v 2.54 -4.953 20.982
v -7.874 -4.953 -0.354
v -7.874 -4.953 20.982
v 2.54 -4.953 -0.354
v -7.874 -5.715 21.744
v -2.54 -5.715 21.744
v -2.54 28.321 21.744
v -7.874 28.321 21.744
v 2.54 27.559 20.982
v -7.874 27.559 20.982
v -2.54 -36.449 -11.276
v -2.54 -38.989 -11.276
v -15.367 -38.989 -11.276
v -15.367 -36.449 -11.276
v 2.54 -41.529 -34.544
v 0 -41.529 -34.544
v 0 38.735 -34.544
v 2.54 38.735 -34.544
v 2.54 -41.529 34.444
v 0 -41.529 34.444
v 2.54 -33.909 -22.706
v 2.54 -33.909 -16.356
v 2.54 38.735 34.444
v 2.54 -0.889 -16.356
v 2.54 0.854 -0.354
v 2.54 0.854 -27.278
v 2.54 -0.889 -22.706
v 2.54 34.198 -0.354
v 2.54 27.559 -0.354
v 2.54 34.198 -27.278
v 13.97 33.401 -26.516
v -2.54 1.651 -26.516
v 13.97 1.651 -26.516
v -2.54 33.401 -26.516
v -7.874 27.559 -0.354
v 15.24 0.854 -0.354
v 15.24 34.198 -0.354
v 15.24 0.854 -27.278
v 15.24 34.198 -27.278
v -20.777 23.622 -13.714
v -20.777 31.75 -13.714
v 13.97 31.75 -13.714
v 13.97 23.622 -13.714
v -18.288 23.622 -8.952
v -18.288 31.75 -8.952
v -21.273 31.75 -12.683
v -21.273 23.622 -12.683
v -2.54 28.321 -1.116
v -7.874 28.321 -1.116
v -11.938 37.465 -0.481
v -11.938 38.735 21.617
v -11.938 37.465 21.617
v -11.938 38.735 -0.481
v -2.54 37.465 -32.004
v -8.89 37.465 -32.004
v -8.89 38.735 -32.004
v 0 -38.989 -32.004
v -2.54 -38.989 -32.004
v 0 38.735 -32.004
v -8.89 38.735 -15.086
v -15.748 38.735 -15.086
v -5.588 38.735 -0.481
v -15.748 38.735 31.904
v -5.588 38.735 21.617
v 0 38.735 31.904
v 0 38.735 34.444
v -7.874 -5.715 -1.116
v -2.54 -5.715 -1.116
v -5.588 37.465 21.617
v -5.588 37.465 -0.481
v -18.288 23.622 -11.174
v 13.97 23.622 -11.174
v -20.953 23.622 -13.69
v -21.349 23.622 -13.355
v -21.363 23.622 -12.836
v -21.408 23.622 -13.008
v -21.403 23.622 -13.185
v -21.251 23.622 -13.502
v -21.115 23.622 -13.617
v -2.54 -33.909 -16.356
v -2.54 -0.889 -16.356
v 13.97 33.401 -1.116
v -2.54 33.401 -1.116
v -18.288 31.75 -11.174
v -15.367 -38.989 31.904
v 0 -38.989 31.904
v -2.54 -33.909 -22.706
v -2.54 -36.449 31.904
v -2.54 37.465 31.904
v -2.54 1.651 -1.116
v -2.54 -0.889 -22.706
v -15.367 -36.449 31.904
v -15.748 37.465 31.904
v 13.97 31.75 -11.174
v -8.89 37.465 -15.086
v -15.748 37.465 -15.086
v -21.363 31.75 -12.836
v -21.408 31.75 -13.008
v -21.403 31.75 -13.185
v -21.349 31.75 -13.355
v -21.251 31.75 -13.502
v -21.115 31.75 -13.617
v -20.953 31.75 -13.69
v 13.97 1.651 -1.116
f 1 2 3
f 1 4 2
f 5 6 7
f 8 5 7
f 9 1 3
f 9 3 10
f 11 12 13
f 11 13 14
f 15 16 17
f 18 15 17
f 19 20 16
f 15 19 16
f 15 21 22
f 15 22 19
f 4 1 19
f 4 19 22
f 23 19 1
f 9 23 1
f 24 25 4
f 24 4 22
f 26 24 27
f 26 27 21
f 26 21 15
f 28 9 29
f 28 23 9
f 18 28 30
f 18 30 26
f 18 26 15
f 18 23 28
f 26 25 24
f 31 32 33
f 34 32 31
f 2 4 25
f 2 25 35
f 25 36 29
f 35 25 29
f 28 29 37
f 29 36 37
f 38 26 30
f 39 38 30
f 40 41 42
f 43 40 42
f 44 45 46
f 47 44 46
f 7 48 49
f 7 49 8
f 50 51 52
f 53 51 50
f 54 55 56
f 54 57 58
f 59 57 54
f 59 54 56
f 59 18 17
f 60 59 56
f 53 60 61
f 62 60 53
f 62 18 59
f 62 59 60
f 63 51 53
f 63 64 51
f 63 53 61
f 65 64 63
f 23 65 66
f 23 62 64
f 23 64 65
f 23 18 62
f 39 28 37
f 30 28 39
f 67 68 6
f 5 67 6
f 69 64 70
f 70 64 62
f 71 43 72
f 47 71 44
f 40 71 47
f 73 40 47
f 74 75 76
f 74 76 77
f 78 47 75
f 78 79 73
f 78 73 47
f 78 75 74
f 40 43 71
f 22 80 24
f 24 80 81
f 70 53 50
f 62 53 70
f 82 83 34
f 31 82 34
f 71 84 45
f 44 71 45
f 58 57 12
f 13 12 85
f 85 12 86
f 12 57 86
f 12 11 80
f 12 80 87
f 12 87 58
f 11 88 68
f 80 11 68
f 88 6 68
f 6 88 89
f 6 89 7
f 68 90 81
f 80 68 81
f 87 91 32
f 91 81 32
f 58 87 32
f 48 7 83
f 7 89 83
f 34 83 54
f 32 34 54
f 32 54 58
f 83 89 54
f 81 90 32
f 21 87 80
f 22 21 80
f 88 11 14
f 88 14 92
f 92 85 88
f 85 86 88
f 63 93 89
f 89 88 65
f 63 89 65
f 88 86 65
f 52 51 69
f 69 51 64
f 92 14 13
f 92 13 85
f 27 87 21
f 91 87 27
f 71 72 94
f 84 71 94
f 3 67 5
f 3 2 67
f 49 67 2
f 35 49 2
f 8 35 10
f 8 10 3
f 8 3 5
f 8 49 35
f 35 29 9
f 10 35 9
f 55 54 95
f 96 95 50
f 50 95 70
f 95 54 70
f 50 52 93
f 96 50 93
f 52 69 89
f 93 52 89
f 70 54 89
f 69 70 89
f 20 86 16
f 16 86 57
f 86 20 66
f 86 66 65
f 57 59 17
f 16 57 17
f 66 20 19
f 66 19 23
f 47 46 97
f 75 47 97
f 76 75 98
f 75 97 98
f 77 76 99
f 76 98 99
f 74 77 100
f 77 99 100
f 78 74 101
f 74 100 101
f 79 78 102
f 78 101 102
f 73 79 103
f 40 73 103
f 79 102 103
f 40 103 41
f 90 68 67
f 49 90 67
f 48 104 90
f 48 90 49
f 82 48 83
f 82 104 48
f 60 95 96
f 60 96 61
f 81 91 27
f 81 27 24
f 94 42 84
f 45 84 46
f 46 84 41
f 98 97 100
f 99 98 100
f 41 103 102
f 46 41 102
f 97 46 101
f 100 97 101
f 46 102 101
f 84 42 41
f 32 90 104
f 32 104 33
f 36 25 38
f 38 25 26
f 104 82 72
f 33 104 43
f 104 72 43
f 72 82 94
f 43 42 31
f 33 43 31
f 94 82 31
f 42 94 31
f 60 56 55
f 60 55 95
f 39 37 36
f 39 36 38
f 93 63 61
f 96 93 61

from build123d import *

# Parameters (mm, degrees)
SKETCH1_W            = 68.987924
SKETCH1_H            = 80.264
BOSS_EXTRUDE3_DEPTH  = 2.54
SKETCH1_7_W          = 63.907924
SKETCH1_7_H          = 77.724
BOSS_EXTRUDE4_DEPTH  = 2.54
SKETCH1_9_W          = 46.99
SKETCH1_9_H          = 1.27
BOSS_EXTRUDE6_DEPTH  = 15.748
SKETCH2_W            = 6.35
SKETCH2_H            = 22.098
CUT_EXTRUDE1_DEPTH   = 2.54
SKETCH3_W            = 16.917924
SKETCH3_H            = 1.27
BOSS_EXTRUDE7_DEPTH  = 6.35
SKETCH4_W            = 21.336
SKETCH4_H            = 32.512
CUT_EXTRUDE2_DEPTH   = 5.08
SKETCH5_W            = 25.4
SKETCH5_H            = 31.75
CUT_EXTRUDE3_DEPTH   = 5.08
SKETCH5_3_W          = 26.924
SKETCH5_3_H          = 33.34449199
SKETCH5_3_W_2        = 25.4
SKETCH5_3_H_2        = 31.75
BOSS_EXTRUDE8_DEPTH  = 12.7
BOSS_EXTRUDE9_START  = 12.7
SKETCH5_4_W          = 25.4
SKETCH5_4_H          = 31.75
BOSS_EXTRUDE9_DEPTH  = 1.27
SKETCH7_W            = 22.86
SKETCH7_H            = 34.036
SKETCH7_W_2          = 21.336
SKETCH7_H_2          = 32.512
BOSS_EXTRUDE10_DEPTH = 5.334
SKETCH6_W            = 6.35
SKETCH6_H            = 33.02
CUT_EXTRUDE5_DEPTH   = 5.334
SKETCH9_W            = 43.18
SKETCH9_H            = 2.54
BOSS_EXTRUDE12_DEPTH = 12.827
SKETCH10_W           = 2.54
SKETCH10_H           = 8.128
BOSS_EXTRUDE13_DEPTH = 32.258
BOSS_EXTRUDE14_DEPTH = 8.128


with BuildPart() as part:
    # Sketch1 → Boss-Extrude3 (new body)
    with BuildSketch(Plane(origin=(0, 0, 0), x_dir=(0, 0, -1), z_dir=(1, 0, 0))):
        with Locations((0.050038, -1.397)):
            Rectangle(SKETCH1_W, SKETCH1_H)
    extrude(amount=BOSS_EXTRUDE3_DEPTH)

    # Sketch1<7> → Boss-Extrude4 (add)
    with BuildSketch(Plane(origin=(0, 0, 0), x_dir=(0, 0, -1), z_dir=(1, 0, 0))):
        with Locations((0.050038, -0.127)):
            Rectangle(SKETCH1_7_W, SKETCH1_7_H)
    extrude(amount=-BOSS_EXTRUDE4_DEPTH)

    # Sketch1<9> → Boss-Extrude6 (add)
    with BuildSketch(Plane(origin=(0, 0, 0), x_dir=(0, 0, -1), z_dir=(1, 0, 0))):
        with Locations((-8.408924, 38.1)):
            Rectangle(SKETCH1_9_W, SKETCH1_9_H)
    extrude(amount=-BOSS_EXTRUDE6_DEPTH)

    # Sketch2 → Cut-Extrude1 (cut)
    with BuildSketch(Plane(origin=(0, 38.735, 0), x_dir=(1, 0, 0), z_dir=(0, 1, 0))):
        with Locations((-8.763, -10.567924)):
            Rectangle(SKETCH2_W, SKETCH2_H)
    extrude(amount=-CUT_EXTRUDE1_DEPTH, mode=Mode.SUBTRACT)

    # Sketch3 → Boss-Extrude7 (add)
    with BuildSketch(Plane.ZY.offset(2.54)):
        with Locations((-23.545038, 38.1)):
            Rectangle(SKETCH3_W, SKETCH3_H)
    extrude(amount=BOSS_EXTRUDE7_DEPTH)

    # Sketch4 → Cut-Extrude2 (cut)
    with BuildSketch(Plane(origin=(2.54, 0, 0), x_dir=(0, 0, -1), z_dir=(1, 0, 0))):
        with Locations((-10.313924, 11.303)):
            Rectangle(SKETCH4_W, SKETCH4_H)
    extrude(amount=-CUT_EXTRUDE2_DEPTH, mode=Mode.SUBTRACT)

    # Sketch5 → Cut-Extrude3 (cut)
    with BuildSketch(Plane(origin=(2.54, 0, 0), x_dir=(0, 0, -1), z_dir=(1, 0, 0))):
        with Locations((13.816076, 17.526)):
            Rectangle(SKETCH5_W, SKETCH5_H)
    extrude(amount=-CUT_EXTRUDE3_DEPTH, mode=Mode.SUBTRACT)

    # Sketch5<3> → Boss-Extrude8 (add)
    with BuildSketch(Plane(origin=(2.54, 0, 0), x_dir=(0, 0, -1), z_dir=(1, 0, 0))):
        with Locations((13.816076, 17.526)):
            Rectangle(SKETCH5_3_W, SKETCH5_3_H)
        with Locations((13.816076, 17.526)):
            Rectangle(SKETCH5_3_W_2, SKETCH5_3_H_2, mode=Mode.SUBTRACT)
    extrude(amount=BOSS_EXTRUDE8_DEPTH)

    # Sketch5<4> → Boss-Extrude9 (add)
    with BuildSketch(Plane(origin=(2.54, 0, 0), x_dir=(0, 0, -1), z_dir=(1, 0, 0)).offset(BOSS_EXTRUDE9_START)):
        with Locations((13.816076, 17.526)):
            Rectangle(SKETCH5_4_W, SKETCH5_4_H)
    extrude(amount=-BOSS_EXTRUDE9_DEPTH)

    # Sketch7 → Boss-Extrude10 (add)
    with BuildSketch(Plane.ZY.offset(2.54)):
        with Locations((10.313924, 11.303)):
            Rectangle(SKETCH7_W, SKETCH7_H)
        with Locations((10.313924, 11.303)):
            Rectangle(SKETCH7_W_2, SKETCH7_H_2, mode=Mode.SUBTRACT)
    extrude(amount=BOSS_EXTRUDE10_DEPTH)

    # Sketch6 → Cut-Extrude5 (cut)
    with BuildSketch(Plane.ZY.offset(2.54)):
        with Locations((-19.531076, -17.399)):
            Rectangle(SKETCH6_W, SKETCH6_H)
    extrude(amount=-CUT_EXTRUDE5_DEPTH, mode=Mode.SUBTRACT)

    # Sketch9 → Boss-Extrude12 (add)
    with BuildSketch(Plane.ZY.offset(2.54)):
        with Locations((10.313924, -37.719)):
            Rectangle(SKETCH9_W, SKETCH9_H)
    extrude(amount=BOSS_EXTRUDE12_DEPTH)

    # Sketch10 → Boss-Extrude13 (add)
    with BuildSketch(Plane.ZY.offset(-13.97)):
        with Locations((-12.444476, 27.686)):
            Rectangle(SKETCH10_W, SKETCH10_H)
    extrude(amount=BOSS_EXTRUDE13_DEPTH)

    # Sketch11 → Boss-Extrude14 (add)
    with BuildSketch(Plane(origin=(0, 31.75, 0), x_dir=(1, 0, 0), z_dir=(0, 1, 0))):
        with BuildLine():
            Line((-18.288, 13.714476), (-18.288, 8.951976))
            Line((-18.288, 8.951976), (-21.272654916, 12.682794645))
            ThreePointArc((-21.272654916, 12.682794645), (-21.349130777, 13.354550844), (-20.776803222, 13.714476))
            Line((-20.776803222, 13.714476), (-18.288, 13.714476))
        make_face()
    extrude(amount=-BOSS_EXTRUDE14_DEPTH)


solid = part.part
